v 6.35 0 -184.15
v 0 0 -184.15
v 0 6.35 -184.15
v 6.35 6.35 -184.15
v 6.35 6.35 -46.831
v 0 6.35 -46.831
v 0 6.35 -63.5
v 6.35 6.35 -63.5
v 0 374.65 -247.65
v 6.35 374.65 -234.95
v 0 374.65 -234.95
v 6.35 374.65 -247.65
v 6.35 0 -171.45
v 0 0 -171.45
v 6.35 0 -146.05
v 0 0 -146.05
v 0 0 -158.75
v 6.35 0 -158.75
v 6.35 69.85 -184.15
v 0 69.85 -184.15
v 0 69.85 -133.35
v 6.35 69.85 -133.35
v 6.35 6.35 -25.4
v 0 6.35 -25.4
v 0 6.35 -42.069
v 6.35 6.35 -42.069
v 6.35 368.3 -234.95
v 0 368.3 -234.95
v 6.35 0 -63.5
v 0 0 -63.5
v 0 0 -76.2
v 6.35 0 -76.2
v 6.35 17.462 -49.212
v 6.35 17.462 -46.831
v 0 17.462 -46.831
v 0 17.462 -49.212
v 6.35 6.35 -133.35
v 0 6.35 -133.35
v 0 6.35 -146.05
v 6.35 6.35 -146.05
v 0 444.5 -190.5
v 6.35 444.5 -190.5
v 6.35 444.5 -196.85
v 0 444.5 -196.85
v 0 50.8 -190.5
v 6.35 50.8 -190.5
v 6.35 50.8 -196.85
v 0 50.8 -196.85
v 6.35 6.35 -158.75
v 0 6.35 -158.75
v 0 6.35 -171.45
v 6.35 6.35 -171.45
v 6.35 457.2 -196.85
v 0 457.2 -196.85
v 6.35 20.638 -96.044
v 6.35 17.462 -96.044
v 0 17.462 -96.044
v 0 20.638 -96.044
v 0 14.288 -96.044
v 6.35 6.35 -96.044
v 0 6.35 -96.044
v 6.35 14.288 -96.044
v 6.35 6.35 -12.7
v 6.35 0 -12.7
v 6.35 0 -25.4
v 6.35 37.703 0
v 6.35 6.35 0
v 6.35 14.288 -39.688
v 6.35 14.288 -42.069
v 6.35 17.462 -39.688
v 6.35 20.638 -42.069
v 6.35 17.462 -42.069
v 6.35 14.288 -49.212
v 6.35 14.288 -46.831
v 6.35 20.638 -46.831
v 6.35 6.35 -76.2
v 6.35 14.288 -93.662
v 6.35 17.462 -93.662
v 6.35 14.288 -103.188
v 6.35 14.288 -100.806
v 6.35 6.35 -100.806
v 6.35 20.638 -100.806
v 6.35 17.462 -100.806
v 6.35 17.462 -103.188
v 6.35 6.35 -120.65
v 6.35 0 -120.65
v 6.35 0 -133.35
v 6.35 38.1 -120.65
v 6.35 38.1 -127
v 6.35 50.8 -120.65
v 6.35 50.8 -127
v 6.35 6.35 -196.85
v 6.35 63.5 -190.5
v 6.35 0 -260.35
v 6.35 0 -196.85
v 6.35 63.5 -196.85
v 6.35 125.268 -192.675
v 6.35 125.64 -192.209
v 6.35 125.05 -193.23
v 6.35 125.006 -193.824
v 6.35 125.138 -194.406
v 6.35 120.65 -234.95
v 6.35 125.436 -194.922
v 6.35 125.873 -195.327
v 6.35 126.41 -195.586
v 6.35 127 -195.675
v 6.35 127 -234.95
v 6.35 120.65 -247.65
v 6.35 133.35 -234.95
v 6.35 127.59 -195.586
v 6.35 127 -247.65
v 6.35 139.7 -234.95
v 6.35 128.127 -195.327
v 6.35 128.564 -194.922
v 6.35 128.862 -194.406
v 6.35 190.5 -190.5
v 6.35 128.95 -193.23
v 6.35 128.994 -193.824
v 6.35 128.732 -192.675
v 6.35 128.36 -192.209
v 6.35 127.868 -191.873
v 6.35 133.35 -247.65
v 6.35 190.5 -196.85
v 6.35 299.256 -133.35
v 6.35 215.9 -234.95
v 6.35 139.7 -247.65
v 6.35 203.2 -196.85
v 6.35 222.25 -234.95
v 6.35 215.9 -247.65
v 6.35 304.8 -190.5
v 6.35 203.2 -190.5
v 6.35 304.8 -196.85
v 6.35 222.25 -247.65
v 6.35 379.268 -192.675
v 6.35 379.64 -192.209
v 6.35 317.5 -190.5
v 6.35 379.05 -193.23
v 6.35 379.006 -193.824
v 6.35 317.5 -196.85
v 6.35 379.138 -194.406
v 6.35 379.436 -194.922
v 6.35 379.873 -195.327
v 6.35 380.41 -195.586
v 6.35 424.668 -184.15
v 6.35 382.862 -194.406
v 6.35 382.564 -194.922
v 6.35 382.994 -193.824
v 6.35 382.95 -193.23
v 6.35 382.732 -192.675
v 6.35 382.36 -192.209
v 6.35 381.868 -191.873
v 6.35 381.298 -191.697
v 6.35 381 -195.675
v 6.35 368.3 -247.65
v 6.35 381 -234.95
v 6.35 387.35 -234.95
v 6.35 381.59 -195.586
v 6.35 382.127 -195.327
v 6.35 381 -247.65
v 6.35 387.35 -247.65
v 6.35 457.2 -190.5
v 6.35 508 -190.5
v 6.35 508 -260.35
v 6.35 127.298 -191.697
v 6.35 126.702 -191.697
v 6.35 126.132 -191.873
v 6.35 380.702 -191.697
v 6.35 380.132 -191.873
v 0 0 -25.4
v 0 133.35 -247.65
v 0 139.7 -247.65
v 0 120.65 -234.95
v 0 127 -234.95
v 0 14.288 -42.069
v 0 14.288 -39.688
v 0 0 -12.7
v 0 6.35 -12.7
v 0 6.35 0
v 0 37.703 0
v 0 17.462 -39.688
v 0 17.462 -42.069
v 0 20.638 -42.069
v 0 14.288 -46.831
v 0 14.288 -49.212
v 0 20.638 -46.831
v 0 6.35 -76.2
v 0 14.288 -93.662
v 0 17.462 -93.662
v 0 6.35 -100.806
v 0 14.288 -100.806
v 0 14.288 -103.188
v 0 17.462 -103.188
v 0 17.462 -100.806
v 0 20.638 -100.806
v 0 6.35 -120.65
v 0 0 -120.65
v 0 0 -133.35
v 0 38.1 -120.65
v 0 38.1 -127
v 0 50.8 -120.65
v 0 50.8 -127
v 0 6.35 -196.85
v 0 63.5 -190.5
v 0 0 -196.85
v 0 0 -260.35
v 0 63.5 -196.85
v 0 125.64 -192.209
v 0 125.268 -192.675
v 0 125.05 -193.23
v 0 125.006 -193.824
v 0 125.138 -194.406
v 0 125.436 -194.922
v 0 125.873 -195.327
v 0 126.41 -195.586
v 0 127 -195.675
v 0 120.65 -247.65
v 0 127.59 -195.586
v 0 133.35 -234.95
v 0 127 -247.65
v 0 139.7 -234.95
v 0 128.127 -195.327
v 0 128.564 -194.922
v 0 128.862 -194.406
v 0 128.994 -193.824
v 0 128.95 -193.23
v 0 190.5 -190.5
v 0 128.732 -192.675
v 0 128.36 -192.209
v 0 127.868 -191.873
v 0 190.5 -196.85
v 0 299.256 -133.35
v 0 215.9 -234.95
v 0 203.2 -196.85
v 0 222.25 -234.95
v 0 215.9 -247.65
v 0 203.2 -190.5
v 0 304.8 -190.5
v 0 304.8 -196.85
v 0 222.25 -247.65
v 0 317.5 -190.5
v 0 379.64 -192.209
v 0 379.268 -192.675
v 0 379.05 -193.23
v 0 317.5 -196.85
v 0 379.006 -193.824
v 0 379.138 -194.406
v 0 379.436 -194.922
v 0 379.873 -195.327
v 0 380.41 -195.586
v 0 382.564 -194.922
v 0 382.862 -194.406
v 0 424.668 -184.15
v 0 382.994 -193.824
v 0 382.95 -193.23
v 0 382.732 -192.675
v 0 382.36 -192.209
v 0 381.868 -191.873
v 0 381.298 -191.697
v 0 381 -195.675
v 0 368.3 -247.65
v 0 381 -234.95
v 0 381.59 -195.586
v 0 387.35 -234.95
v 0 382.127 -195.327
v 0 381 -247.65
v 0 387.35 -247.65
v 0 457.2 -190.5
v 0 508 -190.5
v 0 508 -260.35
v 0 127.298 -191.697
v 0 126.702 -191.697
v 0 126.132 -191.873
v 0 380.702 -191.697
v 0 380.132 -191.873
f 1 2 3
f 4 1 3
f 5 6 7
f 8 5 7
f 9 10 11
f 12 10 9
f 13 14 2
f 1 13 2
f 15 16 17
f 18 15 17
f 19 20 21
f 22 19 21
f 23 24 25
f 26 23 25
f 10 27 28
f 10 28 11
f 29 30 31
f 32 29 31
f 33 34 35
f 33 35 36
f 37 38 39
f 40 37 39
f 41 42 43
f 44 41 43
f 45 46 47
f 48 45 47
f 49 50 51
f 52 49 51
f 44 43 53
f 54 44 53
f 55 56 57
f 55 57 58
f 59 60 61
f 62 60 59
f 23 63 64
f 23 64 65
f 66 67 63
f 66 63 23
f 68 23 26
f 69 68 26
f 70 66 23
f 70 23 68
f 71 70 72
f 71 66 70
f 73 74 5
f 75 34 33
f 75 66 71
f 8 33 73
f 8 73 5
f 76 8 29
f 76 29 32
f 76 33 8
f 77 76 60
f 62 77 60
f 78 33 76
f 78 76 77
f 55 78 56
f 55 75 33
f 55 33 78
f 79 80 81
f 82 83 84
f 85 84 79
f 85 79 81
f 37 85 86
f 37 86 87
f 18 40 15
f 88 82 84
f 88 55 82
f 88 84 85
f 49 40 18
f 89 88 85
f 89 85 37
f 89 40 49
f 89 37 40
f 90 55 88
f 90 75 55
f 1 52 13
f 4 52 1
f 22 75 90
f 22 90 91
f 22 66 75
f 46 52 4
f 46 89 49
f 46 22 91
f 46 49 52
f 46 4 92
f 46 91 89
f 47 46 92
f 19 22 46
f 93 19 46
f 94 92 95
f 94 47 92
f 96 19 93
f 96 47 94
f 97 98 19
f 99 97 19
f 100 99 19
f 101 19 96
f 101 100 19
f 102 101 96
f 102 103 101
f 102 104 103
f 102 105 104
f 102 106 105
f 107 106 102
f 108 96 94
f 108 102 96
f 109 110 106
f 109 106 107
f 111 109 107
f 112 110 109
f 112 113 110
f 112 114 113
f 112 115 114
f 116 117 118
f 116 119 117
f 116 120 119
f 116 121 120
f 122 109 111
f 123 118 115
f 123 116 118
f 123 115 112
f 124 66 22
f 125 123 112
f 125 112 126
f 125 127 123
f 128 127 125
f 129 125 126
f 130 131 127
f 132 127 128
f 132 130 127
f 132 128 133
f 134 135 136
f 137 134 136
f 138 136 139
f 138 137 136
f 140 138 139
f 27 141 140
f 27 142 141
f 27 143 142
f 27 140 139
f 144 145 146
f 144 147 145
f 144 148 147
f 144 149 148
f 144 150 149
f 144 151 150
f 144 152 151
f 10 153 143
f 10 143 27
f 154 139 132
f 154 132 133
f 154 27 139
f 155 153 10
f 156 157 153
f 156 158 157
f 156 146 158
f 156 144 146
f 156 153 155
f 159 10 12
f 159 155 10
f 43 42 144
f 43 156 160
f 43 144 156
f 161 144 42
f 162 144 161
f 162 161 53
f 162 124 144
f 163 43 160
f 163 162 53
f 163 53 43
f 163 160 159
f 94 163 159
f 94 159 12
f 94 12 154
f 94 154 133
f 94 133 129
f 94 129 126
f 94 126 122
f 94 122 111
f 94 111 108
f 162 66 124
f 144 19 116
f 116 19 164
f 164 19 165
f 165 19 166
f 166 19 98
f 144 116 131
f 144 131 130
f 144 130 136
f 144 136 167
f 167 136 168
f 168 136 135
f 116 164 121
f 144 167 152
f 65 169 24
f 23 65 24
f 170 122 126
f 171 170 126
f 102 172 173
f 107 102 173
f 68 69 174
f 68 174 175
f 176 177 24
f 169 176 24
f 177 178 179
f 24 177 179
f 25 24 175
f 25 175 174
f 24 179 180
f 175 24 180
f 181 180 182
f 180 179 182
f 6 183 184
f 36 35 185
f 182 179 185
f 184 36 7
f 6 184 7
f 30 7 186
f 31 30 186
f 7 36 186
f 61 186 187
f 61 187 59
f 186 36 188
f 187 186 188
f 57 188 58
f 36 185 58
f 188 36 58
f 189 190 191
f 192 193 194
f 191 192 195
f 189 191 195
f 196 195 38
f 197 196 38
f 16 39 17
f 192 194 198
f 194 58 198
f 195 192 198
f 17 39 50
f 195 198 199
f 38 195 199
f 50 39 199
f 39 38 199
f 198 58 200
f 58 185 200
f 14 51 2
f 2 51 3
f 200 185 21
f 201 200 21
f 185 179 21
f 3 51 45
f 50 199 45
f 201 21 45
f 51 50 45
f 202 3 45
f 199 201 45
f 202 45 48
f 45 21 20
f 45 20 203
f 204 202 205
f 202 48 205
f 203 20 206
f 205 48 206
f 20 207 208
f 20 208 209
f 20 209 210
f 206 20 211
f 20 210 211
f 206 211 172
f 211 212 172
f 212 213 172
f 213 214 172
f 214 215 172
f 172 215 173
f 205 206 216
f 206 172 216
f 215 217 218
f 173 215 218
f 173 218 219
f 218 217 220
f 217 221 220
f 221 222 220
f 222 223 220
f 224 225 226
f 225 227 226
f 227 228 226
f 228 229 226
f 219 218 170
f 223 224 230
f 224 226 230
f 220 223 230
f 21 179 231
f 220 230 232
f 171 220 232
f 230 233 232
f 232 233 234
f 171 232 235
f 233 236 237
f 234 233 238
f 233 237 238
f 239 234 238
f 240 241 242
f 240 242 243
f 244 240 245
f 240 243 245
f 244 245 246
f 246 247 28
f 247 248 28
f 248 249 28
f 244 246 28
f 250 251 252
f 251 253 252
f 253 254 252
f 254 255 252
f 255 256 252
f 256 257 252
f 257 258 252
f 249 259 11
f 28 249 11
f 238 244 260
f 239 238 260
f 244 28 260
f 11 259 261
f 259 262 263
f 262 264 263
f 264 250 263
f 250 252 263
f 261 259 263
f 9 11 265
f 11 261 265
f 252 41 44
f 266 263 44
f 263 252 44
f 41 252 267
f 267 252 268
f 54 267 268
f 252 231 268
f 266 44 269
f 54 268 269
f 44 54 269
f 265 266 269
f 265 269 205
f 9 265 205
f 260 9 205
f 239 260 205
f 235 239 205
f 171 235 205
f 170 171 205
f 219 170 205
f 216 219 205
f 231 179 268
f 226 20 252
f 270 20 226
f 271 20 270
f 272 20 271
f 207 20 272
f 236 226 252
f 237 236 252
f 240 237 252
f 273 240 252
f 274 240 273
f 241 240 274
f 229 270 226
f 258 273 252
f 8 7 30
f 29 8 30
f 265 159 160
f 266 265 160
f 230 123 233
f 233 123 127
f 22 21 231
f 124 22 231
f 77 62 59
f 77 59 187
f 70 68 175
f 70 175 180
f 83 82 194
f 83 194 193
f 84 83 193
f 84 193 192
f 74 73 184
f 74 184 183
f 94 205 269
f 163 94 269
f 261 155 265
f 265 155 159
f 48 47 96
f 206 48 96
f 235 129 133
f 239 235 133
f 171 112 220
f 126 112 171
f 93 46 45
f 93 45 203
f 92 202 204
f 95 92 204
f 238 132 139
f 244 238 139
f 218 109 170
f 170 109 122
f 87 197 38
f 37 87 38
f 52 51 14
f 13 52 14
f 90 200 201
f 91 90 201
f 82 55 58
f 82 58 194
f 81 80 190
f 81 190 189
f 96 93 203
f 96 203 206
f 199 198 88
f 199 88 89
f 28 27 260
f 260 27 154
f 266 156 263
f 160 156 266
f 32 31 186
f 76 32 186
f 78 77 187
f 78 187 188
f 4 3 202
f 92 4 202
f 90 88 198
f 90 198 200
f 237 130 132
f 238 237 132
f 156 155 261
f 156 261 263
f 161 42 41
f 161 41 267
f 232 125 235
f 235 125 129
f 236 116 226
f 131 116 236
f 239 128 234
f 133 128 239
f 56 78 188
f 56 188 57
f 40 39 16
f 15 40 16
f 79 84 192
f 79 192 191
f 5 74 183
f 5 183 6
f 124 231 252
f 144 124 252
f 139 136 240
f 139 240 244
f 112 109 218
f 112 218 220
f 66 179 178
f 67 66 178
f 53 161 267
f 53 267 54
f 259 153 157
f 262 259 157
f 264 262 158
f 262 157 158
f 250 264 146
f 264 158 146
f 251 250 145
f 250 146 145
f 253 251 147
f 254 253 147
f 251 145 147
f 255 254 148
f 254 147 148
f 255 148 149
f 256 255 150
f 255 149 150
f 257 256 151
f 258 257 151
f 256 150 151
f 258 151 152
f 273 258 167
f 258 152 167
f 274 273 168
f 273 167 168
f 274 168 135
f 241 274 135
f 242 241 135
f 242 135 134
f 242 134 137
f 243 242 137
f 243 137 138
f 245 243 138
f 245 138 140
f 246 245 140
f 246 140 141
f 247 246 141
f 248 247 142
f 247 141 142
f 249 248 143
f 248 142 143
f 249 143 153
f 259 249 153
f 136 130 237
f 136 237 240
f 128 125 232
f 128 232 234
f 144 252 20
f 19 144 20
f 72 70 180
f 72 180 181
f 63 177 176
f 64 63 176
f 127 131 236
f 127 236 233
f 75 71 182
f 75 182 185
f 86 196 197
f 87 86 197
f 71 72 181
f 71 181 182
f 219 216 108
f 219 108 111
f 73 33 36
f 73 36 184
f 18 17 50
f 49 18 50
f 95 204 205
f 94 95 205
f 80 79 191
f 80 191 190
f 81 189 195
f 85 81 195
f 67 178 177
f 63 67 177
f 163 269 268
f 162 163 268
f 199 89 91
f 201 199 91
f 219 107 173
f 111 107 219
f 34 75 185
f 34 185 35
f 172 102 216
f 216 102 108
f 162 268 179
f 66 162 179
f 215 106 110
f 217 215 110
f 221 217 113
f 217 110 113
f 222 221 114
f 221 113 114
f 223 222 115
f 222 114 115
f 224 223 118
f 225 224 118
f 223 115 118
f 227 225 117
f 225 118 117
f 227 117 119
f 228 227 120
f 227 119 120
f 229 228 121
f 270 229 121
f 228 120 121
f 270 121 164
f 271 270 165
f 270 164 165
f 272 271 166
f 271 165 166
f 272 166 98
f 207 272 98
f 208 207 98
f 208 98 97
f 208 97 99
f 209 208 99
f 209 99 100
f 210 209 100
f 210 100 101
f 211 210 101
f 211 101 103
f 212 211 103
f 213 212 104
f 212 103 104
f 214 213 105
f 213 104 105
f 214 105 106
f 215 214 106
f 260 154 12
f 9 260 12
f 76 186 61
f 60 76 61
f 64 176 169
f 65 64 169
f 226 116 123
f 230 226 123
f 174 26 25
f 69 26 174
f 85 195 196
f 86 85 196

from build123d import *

# Parameters (mm, degrees)
BOSS_EXTRUDE1_DEPTH = 6.35
CUT_EXTRUDE1_DEPTH  = 6.35
SKETCH5_R           = 2
SKETCH5_W           = 6.35
SKETCH5_H           = 12.7
SKETCH5_W_2         = 12.7
SKETCH5_H_2         = 6.35
CUT_EXTRUDE2_DEPTH  = 6.35
SKETCH6_W           = 6.35
SKETCH6_H           = 12.7
CUT_EXTRUDE3_DEPTH  = 6.35
SKETCH7_W           = 12.7
SKETCH7_H           = 6.35
CUT_EXTRUDE4_DEPTH  = 6.35


with BuildPart() as part:
    # Sketch1 → Boss-Extrude1 (new body)
    with BuildSketch(Plane(origin=(0, 0, 0), x_dir=(0, 0, -1), z_dir=(1, 0, 0))):
        Polygon((12.7, 6.35), (12.7, 0), (25.4, 0), (25.4, 6.35), (63.5, 6.35), (63.5, 0), (76.2, 0), (76.2, 6.35), (120.65, 6.35), (120.65, 0), (133.35, 0), (133.35, 6.35), (146.05, 6.35), (146.05, 0), (158.75, 0), (158.75, 6.35), (171.45, 6.35), (171.45, 0), (176.749457482, 0), (184.15, 0), (184.15, 6.35), (196.85, 6.35), (196.85, 0), (260.35, 0), (260.35, 508), (190.5, 508), (0, 37.703125), (0, 6.35), align=None)
        Polygon((133.35, 299.255680579), (184.15, 424.668180579), (184.15, 69.85), (133.35, 69.85), (133.35, 274.095300459), align=None, mode=Mode.SUBTRACT)
    extrude(amount=BOSS_EXTRUDE1_DEPTH)

    # Sketch3 → Cut-Extrude1 (cut)
    with BuildSketch(Plane(origin=(6.35, 0, 0), x_dir=(0, 0, -1), z_dir=(1, 0, 0))):
        Polygon((49.2125, 17.4625), (49.2125, 14.2875), (46.83125, 14.2875), (46.83125, 6.35), (42.06875, 6.35), (42.06875, 14.2875), (39.6875, 14.2875), (39.6875, 17.4625), (42.06875, 17.4625), (42.06875, 20.6375), (46.83125, 20.6375), (46.83125, 17.4625), align=None)
        Polygon((103.1875, 17.4625), (103.1875, 14.2875), (100.80625, 14.2875), (100.80625, 6.35), (96.04375, 6.35), (96.04375, 14.2875), (93.6625, 14.2875), (93.6625, 17.4625), (96.04375, 17.4625), (96.04375, 20.6375), (100.80625, 20.6375), (100.80625, 17.4625), align=None)
    extrude(amount=-CUT_EXTRUDE1_DEPTH, mode=Mode.SUBTRACT)

    # Sketch5 → Cut-Extrude2 (cut)
    with BuildSketch(Plane(origin=(6.35, 0, 0), x_dir=(0, 0, -1), z_dir=(1, 0, 0))):
        with Locations((193.675, 127)):
            Circle(SKETCH5_R)
        with Locations((193.675, 381)):
            Circle(SKETCH5_R)
        with Locations((193.675, 57.15)):
            Rectangle(SKETCH5_W, SKETCH5_H)
        with Locations((193.675, 196.85)):
            Rectangle(SKETCH5_W, SKETCH5_H)
        with Locations((241.3, 371.475)):
            Rectangle(SKETCH5_W_2, SKETCH5_H_2)
        with Locations((241.3, 123.825)):
            Rectangle(SKETCH5_W_2, SKETCH5_H_2)
        with Locations((241.3, 136.525)):
            Rectangle(SKETCH5_W_2, SKETCH5_H_2)
        with Locations((241.3, 384.175)):
            Rectangle(SKETCH5_W_2, SKETCH5_H_2)
        with Locations((193.675, 311.15)):
            Rectangle(SKETCH5_W, SKETCH5_H)
        with Locations((193.675, 450.85)):
            Rectangle(SKETCH5_W, SKETCH5_H)
    extrude(amount=-CUT_EXTRUDE2_DEPTH, mode=Mode.SUBTRACT)

    # Sketch6 → Cut-Extrude3 (cut)
    with BuildSketch(Plane(origin=(6.35, 0, 0), x_dir=(0, 0, -1), z_dir=(1, 0, 0))):
        with Locations((123.825, 44.45)):
            Rectangle(SKETCH6_W, SKETCH6_H)
    extrude(amount=-CUT_EXTRUDE3_DEPTH, mode=Mode.SUBTRACT)

    # Sketch7 → Cut-Extrude4 (cut)
    with BuildSketch(Plane(origin=(6.35, 0, 0), x_dir=(0, 0, -1), z_dir=(1, 0, 0))):
        with Locations((241.3, 219.075)):
            Rectangle(SKETCH7_W, SKETCH7_H)
    extrude(amount=-CUT_EXTRUDE4_DEPTH, mode=Mode.SUBTRACT)


solid = part.part
